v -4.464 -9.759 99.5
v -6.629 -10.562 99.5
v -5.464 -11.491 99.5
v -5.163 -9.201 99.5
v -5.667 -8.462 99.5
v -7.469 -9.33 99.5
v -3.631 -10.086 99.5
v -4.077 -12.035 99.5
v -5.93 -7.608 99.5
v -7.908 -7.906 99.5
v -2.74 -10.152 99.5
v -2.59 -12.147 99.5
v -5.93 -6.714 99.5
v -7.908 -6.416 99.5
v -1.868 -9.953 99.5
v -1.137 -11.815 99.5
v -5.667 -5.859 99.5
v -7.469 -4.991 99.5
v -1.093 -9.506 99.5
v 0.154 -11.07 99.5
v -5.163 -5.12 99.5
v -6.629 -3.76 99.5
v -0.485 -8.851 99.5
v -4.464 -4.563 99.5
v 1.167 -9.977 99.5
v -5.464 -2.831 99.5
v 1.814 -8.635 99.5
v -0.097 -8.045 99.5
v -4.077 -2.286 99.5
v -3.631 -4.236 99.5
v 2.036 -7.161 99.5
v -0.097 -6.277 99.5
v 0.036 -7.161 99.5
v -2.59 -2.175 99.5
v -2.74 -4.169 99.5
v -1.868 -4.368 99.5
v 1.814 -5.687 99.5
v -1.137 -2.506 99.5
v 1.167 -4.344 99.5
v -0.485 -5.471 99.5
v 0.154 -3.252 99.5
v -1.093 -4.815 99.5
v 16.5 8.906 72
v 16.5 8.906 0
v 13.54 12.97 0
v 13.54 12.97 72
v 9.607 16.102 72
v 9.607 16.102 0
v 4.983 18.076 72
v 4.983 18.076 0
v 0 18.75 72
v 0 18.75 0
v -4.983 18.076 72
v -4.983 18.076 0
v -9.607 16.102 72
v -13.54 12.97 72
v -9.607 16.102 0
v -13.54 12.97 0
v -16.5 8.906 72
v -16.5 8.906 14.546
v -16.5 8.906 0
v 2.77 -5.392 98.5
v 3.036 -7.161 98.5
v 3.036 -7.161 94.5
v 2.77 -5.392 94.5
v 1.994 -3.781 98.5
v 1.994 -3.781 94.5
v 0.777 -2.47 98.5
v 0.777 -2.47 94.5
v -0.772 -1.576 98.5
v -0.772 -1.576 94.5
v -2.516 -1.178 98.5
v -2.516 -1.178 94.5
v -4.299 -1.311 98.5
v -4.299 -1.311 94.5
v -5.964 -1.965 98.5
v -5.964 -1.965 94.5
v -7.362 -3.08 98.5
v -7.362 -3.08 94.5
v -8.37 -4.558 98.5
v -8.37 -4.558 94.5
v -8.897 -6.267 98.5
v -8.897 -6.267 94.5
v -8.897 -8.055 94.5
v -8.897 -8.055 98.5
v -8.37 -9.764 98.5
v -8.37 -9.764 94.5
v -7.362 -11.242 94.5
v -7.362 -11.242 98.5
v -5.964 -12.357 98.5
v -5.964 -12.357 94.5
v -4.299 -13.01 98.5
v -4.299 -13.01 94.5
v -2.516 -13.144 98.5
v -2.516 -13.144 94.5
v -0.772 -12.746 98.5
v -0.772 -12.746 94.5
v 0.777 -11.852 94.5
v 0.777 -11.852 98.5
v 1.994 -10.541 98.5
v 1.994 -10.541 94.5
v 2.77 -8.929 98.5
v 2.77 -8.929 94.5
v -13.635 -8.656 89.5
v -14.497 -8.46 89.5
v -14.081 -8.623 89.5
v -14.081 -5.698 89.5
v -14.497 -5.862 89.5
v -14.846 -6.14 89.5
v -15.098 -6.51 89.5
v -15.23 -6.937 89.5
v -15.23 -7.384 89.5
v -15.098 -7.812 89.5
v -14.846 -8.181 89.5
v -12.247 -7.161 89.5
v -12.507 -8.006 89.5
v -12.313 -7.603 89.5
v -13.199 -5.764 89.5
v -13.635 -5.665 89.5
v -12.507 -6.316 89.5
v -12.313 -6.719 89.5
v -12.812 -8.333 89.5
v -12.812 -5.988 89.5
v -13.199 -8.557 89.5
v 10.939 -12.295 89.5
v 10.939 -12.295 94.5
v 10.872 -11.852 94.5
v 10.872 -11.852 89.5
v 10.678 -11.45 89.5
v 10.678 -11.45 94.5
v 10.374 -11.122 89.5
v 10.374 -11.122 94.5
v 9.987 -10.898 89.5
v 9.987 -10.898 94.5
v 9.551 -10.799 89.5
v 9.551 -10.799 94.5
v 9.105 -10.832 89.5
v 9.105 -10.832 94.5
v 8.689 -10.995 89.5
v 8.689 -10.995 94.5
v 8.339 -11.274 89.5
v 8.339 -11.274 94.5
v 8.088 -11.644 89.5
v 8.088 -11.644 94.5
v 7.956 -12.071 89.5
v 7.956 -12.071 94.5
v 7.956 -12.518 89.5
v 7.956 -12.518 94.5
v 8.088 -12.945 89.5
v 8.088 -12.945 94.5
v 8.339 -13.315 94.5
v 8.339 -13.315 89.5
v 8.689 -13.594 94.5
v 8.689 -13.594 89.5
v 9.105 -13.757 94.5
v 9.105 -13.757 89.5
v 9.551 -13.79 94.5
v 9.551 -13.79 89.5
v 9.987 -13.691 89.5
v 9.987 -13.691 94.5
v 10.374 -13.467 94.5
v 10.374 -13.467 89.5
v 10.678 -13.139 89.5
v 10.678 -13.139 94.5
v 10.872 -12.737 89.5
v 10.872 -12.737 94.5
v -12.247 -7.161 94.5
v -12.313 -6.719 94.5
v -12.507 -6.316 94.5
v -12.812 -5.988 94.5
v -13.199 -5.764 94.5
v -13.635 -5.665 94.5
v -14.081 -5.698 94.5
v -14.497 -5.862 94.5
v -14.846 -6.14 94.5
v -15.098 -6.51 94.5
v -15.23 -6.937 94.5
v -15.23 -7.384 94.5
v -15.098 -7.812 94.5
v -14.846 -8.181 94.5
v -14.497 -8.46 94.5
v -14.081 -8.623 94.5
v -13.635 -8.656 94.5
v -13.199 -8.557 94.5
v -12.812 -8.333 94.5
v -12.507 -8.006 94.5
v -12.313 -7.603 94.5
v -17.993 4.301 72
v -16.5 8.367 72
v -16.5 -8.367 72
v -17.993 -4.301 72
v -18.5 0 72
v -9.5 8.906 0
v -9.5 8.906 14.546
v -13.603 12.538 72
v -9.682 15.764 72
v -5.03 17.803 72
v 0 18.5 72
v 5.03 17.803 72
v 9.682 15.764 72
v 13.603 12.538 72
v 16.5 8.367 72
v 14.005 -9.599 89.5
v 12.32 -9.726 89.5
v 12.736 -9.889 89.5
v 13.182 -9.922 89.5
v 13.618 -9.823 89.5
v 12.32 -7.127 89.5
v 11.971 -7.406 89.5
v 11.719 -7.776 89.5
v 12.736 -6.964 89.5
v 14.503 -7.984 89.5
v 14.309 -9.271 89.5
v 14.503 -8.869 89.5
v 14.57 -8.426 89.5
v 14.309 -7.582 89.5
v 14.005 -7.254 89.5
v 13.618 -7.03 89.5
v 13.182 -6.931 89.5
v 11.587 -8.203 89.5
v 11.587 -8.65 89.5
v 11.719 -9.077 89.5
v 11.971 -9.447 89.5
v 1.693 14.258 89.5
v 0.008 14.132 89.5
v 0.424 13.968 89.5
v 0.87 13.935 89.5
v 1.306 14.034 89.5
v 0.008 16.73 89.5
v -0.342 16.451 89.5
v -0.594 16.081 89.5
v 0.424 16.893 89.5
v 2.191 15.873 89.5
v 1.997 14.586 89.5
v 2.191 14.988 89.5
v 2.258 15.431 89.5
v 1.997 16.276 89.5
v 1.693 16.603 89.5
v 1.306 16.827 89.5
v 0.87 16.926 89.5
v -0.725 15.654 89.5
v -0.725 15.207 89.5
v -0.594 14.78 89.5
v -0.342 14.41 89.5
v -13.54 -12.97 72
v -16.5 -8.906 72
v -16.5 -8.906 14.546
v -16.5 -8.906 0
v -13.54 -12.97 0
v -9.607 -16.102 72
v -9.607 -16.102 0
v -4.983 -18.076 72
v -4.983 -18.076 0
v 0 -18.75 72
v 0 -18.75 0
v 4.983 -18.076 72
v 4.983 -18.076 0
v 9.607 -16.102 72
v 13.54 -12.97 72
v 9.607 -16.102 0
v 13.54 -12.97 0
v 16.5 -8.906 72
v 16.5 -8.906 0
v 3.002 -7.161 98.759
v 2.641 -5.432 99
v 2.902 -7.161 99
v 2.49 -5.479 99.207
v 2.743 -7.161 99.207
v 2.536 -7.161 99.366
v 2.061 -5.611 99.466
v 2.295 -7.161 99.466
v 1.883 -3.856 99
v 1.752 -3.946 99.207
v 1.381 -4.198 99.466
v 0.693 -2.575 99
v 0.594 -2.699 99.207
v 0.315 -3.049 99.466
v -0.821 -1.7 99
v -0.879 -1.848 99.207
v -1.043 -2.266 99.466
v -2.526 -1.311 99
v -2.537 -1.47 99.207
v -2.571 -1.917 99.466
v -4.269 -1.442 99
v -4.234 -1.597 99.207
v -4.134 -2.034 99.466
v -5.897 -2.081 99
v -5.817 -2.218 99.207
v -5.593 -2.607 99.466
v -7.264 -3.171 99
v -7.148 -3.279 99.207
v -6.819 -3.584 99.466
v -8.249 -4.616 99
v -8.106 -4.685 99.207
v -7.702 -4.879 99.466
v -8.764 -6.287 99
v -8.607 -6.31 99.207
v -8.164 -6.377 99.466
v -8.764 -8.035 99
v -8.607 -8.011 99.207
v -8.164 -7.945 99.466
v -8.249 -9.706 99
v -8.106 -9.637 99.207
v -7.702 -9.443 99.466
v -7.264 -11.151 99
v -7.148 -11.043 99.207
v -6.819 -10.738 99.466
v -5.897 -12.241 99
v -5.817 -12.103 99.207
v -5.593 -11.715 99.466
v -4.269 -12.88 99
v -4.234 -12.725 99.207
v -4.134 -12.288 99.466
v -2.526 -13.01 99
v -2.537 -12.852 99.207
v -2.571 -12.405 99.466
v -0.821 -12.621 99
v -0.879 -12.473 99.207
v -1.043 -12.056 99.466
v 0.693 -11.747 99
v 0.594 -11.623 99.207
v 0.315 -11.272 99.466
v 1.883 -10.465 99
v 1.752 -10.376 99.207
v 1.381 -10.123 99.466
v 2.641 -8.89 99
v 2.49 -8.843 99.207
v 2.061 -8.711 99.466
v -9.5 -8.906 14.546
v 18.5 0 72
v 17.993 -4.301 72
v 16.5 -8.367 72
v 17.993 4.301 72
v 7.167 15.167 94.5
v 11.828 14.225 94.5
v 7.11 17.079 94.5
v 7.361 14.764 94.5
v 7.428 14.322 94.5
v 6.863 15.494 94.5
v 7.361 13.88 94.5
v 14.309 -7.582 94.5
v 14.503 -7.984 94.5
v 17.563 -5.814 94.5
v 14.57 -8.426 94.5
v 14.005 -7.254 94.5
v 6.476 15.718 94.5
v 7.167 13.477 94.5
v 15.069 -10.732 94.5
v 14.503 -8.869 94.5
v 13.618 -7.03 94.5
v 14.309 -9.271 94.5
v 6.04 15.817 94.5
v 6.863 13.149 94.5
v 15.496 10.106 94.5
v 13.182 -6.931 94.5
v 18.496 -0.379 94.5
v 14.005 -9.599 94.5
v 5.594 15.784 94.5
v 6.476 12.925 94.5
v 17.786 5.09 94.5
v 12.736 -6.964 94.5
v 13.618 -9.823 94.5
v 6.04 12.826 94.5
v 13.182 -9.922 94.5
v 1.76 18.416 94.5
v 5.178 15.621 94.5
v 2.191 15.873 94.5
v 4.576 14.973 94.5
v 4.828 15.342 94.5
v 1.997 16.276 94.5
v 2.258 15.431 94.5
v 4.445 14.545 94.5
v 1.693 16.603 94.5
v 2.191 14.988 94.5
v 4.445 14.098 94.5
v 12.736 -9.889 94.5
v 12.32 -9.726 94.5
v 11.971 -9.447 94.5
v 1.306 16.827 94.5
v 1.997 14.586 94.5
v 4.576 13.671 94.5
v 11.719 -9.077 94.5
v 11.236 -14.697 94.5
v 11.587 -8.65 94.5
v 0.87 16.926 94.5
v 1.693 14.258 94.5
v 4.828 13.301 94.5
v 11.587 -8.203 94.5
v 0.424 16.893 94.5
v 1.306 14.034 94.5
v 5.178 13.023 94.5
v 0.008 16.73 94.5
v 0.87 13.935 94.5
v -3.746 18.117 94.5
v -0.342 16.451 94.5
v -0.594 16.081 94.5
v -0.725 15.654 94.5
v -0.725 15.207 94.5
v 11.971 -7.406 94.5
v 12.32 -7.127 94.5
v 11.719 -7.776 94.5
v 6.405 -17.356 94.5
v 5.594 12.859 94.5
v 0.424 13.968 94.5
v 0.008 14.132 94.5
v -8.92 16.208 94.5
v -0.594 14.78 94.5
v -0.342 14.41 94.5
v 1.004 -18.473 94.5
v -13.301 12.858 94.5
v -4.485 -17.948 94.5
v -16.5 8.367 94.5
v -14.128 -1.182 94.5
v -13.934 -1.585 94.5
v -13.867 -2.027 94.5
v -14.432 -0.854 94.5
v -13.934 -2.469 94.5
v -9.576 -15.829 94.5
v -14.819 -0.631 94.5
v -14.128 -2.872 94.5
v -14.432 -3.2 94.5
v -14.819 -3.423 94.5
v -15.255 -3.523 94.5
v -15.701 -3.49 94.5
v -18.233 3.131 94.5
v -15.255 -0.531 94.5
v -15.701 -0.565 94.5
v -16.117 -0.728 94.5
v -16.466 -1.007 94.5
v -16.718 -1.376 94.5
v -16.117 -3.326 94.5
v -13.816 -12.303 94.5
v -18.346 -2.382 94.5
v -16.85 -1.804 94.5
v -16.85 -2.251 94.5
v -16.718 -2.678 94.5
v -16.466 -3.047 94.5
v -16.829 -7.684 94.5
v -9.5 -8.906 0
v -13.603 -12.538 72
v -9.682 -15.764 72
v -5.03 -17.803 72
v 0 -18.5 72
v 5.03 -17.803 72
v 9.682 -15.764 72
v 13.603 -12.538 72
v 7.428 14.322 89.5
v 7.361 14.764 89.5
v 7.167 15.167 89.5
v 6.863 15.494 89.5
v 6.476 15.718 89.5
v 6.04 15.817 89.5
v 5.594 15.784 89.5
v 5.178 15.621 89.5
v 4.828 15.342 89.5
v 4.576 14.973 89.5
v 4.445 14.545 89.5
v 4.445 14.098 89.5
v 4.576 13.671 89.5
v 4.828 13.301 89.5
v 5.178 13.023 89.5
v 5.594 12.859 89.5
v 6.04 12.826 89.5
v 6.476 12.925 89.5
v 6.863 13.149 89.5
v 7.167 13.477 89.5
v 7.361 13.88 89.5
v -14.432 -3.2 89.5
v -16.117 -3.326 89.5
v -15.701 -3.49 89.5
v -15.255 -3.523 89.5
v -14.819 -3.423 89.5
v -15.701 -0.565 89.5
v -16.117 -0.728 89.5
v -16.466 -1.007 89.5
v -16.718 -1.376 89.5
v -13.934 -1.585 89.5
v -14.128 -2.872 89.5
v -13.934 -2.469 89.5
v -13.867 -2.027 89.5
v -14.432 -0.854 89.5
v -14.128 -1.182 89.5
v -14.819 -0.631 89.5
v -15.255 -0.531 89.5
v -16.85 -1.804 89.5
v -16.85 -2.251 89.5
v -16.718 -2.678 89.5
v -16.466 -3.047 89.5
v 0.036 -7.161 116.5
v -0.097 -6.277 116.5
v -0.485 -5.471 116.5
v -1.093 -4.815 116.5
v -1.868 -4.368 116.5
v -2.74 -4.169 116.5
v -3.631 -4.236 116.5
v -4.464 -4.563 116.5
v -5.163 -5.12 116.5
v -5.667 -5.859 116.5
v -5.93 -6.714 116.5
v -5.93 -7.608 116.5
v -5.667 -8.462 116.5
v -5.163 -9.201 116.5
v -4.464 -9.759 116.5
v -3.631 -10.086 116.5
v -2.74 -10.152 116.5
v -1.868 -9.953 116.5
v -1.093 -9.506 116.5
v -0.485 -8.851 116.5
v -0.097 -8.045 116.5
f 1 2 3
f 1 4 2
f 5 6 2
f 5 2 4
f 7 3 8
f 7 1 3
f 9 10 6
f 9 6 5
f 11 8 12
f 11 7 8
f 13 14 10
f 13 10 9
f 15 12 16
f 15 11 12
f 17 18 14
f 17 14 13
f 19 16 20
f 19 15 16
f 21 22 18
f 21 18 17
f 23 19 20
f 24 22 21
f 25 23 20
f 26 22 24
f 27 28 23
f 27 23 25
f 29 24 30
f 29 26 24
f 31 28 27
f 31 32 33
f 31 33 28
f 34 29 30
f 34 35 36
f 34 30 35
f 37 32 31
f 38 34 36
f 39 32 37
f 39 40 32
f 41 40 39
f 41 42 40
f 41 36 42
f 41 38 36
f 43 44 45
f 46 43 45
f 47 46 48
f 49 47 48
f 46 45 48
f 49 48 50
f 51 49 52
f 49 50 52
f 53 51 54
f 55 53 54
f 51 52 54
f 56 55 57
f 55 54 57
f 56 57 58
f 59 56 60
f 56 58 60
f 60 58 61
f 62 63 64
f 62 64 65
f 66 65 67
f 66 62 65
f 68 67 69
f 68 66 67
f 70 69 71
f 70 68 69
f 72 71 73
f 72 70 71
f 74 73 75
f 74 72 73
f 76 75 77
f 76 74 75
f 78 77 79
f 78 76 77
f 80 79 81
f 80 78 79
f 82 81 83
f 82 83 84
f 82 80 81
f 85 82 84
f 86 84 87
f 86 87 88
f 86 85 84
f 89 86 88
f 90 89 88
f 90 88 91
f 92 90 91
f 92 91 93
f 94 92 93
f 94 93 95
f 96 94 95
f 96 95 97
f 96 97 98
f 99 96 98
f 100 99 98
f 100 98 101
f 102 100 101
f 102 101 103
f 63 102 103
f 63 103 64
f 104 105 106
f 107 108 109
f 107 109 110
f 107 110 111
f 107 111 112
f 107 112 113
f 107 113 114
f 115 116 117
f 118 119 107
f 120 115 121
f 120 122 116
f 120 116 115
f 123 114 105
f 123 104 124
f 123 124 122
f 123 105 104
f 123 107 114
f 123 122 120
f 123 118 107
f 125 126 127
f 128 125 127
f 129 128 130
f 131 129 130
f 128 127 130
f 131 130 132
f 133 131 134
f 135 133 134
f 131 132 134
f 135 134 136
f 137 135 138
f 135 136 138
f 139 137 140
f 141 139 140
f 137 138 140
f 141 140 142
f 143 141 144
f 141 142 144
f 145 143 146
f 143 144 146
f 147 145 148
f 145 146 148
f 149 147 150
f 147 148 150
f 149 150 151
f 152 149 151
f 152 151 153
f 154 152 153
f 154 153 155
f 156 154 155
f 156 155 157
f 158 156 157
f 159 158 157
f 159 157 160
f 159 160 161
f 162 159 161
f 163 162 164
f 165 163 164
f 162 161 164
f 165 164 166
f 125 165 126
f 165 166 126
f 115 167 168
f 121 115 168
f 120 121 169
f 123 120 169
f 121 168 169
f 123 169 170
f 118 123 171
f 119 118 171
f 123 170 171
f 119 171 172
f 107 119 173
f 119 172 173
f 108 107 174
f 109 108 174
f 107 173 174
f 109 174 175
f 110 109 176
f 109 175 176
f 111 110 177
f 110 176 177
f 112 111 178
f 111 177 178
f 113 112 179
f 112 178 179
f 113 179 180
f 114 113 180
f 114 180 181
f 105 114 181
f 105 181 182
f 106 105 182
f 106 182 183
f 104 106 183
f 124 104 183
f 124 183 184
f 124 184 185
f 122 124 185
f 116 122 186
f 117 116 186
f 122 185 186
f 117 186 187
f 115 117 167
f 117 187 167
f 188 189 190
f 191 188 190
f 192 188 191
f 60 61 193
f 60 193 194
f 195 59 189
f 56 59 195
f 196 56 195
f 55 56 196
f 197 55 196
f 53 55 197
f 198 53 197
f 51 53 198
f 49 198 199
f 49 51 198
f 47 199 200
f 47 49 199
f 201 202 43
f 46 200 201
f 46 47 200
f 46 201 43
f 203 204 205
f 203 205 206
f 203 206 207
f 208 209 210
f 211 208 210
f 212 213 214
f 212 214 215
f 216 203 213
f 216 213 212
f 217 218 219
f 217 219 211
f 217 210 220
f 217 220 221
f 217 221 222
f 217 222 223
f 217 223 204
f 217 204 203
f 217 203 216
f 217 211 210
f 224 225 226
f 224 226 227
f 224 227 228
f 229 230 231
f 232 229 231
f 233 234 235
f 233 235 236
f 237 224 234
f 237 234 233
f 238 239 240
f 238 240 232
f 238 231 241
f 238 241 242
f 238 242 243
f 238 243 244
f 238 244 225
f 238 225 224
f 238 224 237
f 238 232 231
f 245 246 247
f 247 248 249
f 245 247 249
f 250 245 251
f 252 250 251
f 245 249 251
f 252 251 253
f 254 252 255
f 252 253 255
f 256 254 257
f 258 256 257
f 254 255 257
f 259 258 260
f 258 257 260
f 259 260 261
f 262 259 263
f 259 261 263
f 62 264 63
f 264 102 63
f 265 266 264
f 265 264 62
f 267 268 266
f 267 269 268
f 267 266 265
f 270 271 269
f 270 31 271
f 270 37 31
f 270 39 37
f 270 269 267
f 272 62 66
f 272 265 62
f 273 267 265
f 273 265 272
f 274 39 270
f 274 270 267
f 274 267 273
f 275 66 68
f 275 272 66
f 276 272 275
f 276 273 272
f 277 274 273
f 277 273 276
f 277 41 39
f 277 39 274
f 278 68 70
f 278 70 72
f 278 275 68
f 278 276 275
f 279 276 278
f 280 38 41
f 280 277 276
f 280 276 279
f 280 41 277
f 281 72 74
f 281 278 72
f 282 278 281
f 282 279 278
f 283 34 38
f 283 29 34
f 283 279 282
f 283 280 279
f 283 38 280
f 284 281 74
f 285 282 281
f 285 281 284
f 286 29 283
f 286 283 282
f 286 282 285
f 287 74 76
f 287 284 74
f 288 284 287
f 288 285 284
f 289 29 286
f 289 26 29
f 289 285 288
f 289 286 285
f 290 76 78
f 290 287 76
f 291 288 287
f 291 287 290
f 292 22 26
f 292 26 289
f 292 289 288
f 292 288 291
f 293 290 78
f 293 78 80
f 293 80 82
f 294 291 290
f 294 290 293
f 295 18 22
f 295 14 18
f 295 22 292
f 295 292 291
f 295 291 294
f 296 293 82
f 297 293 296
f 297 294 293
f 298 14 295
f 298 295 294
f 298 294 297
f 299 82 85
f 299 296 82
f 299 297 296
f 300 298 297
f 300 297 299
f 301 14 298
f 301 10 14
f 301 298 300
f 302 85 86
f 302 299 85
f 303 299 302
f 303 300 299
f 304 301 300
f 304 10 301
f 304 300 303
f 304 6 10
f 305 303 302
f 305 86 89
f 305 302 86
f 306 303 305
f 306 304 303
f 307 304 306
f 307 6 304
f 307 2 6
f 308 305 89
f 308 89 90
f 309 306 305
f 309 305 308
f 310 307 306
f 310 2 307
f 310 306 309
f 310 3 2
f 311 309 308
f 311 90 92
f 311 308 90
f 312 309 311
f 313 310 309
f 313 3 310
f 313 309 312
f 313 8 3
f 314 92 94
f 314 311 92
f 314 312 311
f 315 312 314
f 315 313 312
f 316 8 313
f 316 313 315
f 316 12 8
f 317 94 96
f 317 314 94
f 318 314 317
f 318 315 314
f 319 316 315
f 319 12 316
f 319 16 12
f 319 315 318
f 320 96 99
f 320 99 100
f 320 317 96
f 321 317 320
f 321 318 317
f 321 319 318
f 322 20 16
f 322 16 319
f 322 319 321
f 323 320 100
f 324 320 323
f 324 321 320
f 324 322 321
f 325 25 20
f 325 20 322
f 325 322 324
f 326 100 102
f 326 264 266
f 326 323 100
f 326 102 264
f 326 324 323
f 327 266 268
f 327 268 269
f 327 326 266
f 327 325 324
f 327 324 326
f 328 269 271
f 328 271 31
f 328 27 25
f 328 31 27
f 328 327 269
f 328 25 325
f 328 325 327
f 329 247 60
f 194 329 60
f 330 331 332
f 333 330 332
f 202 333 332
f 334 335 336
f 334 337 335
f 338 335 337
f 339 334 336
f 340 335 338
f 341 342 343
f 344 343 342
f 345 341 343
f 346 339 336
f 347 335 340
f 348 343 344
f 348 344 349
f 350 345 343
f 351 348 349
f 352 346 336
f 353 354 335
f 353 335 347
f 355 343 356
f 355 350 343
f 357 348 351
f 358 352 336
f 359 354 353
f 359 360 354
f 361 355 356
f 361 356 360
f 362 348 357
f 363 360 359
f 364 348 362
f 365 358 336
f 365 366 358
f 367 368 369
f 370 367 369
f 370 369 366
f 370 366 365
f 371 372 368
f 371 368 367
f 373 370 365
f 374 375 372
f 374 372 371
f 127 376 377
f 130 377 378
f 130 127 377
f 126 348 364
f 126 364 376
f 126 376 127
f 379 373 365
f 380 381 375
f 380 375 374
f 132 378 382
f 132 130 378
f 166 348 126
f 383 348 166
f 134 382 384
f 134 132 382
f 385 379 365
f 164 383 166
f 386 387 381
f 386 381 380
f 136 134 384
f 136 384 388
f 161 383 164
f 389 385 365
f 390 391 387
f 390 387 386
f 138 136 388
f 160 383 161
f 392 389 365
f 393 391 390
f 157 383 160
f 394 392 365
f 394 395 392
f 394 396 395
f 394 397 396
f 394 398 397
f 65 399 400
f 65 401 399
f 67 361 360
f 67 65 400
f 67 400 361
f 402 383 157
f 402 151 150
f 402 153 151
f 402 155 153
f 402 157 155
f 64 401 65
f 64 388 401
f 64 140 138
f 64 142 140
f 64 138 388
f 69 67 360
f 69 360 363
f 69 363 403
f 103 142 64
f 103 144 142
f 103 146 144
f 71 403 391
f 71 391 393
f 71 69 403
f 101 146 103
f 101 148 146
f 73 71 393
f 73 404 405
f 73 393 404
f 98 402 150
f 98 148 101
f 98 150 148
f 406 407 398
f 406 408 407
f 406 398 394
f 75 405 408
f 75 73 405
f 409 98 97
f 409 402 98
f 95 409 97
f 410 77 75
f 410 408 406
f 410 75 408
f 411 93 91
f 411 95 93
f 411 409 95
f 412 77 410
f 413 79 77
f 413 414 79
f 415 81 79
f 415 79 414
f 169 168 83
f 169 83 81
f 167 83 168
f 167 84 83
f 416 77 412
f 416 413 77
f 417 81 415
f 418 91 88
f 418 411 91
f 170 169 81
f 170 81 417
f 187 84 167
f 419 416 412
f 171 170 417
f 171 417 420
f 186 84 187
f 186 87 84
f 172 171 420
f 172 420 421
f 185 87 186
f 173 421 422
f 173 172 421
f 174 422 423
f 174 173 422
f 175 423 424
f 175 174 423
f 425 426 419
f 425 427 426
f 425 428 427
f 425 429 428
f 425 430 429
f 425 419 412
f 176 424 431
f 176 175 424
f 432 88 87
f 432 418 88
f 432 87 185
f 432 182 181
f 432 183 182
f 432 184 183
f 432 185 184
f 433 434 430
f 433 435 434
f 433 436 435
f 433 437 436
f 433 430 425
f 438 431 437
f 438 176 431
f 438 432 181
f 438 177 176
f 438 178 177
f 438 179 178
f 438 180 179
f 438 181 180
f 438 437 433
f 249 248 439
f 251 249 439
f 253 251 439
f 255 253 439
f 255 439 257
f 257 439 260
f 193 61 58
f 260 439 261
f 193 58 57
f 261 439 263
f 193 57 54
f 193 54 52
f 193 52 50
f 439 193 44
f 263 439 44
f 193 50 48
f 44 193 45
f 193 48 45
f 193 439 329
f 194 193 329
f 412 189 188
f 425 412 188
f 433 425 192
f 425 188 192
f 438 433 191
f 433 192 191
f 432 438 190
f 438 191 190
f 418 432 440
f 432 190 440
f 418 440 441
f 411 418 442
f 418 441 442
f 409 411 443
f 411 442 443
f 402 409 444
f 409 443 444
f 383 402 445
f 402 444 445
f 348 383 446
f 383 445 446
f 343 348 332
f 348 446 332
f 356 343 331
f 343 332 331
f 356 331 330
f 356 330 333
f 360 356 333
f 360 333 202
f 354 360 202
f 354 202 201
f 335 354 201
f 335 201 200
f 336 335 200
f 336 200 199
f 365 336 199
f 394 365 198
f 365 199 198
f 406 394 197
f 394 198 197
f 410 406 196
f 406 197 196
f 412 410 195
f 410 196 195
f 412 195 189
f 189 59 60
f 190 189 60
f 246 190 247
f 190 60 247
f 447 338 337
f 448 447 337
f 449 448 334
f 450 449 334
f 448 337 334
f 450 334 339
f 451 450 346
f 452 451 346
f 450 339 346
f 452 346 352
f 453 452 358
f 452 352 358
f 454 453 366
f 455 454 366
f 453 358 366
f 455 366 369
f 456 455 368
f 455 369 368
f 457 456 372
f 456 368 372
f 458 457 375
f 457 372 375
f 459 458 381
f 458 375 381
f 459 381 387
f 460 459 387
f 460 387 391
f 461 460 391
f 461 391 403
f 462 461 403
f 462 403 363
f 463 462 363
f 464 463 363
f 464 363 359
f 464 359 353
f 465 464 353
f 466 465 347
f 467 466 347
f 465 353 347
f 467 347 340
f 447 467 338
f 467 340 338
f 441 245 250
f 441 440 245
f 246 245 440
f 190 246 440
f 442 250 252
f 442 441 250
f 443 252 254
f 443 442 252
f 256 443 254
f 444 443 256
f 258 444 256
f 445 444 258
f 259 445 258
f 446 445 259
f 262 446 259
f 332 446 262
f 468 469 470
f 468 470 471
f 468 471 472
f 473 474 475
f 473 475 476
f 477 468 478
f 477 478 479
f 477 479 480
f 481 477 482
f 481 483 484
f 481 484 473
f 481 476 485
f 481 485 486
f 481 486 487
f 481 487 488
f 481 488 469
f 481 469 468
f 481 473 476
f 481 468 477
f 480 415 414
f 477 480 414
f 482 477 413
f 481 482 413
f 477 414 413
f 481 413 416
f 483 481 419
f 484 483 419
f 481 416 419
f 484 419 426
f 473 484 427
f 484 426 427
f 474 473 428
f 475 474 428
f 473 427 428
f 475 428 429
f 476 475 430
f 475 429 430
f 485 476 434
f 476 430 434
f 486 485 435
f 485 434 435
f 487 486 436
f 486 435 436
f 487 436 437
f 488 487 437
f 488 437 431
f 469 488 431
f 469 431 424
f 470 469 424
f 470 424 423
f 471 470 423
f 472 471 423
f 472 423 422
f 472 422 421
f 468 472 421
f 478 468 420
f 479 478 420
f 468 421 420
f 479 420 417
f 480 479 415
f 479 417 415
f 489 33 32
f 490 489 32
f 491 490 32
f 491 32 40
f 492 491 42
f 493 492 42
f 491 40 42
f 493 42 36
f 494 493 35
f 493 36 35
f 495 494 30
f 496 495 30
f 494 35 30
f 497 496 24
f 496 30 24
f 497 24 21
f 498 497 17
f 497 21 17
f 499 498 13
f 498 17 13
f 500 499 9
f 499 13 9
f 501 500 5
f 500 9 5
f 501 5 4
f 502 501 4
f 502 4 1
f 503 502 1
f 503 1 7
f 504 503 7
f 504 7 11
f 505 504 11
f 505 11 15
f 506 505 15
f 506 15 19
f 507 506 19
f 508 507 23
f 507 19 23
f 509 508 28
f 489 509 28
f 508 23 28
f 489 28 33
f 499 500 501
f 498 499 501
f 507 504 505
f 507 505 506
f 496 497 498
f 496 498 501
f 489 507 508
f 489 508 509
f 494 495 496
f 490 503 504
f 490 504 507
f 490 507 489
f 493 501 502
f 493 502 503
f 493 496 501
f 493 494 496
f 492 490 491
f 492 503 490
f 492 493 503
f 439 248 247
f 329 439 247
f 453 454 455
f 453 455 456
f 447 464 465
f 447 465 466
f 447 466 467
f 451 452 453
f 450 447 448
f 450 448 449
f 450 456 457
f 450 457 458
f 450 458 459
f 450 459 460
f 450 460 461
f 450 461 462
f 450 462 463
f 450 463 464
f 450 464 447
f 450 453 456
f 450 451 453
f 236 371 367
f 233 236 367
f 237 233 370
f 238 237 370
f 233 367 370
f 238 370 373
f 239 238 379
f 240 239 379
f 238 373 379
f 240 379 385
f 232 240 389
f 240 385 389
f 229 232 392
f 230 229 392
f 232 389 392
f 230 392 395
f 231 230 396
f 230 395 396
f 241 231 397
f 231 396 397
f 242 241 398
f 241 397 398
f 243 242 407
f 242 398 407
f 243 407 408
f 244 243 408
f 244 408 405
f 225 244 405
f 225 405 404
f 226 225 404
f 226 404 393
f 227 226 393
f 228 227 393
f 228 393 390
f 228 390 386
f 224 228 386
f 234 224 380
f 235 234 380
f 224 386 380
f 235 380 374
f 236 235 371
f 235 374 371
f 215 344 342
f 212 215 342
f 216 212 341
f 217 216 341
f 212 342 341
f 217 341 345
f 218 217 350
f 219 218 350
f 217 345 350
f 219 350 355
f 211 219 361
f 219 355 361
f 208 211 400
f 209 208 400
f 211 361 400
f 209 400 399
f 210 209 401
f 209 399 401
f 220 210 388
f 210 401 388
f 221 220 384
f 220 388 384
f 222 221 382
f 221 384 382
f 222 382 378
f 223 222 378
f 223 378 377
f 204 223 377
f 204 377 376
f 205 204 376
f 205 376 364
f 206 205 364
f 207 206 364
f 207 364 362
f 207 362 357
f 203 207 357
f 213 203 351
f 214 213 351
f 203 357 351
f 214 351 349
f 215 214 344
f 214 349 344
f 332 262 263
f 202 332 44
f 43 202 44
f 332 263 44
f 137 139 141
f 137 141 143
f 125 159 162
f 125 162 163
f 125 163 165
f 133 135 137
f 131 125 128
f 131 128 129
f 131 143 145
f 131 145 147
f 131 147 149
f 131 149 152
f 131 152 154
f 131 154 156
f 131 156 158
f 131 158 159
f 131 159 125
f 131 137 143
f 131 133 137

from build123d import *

# Parameters (mm, degrees)
BOSS_EXTRUDE1_DEPTH = 72
SKETCH2_R           = 18.5
BOSS_EXTRUDE2_DEPTH = 22.5
SKETCH3_R           = 1.5
SKETCH3_R_2         = 6
CUT_EXTRUDE1_DEPTH  = 5
BOSS_EXTRUDE3_START = 10
SKETCH4_R           = 6
BOSS_EXTRUDE3_DEPTH = 10
FILLET1_R           = 1
SKETCH5_R           = 3
BOSS_EXTRUDE4_DEPTH = 17
SKETCH6_W           = 14.545544233
SKETCH6_H           = 17.81151313
CUT_EXTRUDE2_DEPTH  = 7


with BuildPart() as part:
    # Sketch1 → Boss-Extrude1 (new body)
    with BuildSketch(Plane.XY):
        with BuildLine():
            Line((-16.5, 8.905756565), (-16.5, -8.905756565))
            ThreePointArc((-16.5, -8.905756565), (0, -18.75), (16.5, -8.905756565))
            Line((16.5, -8.905756565), (16.5, 8.905756565))
            ThreePointArc((16.5, 8.905756565), (0, 18.75), (-16.5, 8.905756565))
        make_face()
    extrude(amount=BOSS_EXTRUDE1_DEPTH)

    # Sketch2 → Boss-Extrude2 (add)
    with BuildSketch(Plane.XY.offset(72)):
        with Locations(Location((0, 0, 0), (0, 0, 153.111952382))):
            Circle(SKETCH2_R)
    extrude(amount=BOSS_EXTRUDE2_DEPTH)

    # Sketch3 → Cut-Extrude1 (cut)
    with BuildSketch(Plane.XY.offset(94.5)):
        with Locations((-13.74680181, -7.160687119)):
            Circle(SKETCH3_R)
        with Locations((0.757881483, 15.430553719)):
            Circle(SKETCH3_R)
        with Locations((13.070128305, -8.426490905)):
            Circle(SKETCH3_R)
        with Locations((-15.366867454, -2.02716172)):
            Circle(SKETCH3_R)
        with Locations((5.92786018, 14.321678452)):
            Circle(SKETCH3_R)
        with Locations((9.439007274, -12.294516732)):
            Circle(SKETCH3_R)
        with Locations((-2.96393009, -7.160839226)):
            Circle(SKETCH3_R_2)
    extrude(amount=-CUT_EXTRUDE1_DEPTH, mode=Mode.SUBTRACT)

    # Sketch4 → Boss-Extrude3 (add)
    with BuildSketch(Plane.XY.offset(89.5).offset(BOSS_EXTRUDE3_START)):
        with Locations((-2.96393009, -7.160839226)):
            Circle(SKETCH4_R)
    extrude(amount=-BOSS_EXTRUDE3_DEPTH)

    # Fillet1
    fillet1_edges = [part.edges().sort_by_distance(p)[0] for p in [
        (-8.96393009, -7.160839226, 99.5),
    ]]
    fillet(fillet1_edges, radius=FILLET1_R)

    # Sketch5 → Boss-Extrude4 (add)
    with BuildSketch(Plane.XY.offset(99.5)):
        with Locations((-2.96393009, -7.160839226)):
            Circle(SKETCH5_R)
    extrude(amount=BOSS_EXTRUDE4_DEPTH)

    # Sketch6 → Cut-Extrude2 (cut)
    with BuildSketch(Plane.ZY.offset(16.5)):
        with Locations((7.272772117, 0)):
            Rectangle(SKETCH6_W, SKETCH6_H)
    extrude(amount=-CUT_EXTRUDE2_DEPTH, mode=Mode.SUBTRACT)


solid = part.part
